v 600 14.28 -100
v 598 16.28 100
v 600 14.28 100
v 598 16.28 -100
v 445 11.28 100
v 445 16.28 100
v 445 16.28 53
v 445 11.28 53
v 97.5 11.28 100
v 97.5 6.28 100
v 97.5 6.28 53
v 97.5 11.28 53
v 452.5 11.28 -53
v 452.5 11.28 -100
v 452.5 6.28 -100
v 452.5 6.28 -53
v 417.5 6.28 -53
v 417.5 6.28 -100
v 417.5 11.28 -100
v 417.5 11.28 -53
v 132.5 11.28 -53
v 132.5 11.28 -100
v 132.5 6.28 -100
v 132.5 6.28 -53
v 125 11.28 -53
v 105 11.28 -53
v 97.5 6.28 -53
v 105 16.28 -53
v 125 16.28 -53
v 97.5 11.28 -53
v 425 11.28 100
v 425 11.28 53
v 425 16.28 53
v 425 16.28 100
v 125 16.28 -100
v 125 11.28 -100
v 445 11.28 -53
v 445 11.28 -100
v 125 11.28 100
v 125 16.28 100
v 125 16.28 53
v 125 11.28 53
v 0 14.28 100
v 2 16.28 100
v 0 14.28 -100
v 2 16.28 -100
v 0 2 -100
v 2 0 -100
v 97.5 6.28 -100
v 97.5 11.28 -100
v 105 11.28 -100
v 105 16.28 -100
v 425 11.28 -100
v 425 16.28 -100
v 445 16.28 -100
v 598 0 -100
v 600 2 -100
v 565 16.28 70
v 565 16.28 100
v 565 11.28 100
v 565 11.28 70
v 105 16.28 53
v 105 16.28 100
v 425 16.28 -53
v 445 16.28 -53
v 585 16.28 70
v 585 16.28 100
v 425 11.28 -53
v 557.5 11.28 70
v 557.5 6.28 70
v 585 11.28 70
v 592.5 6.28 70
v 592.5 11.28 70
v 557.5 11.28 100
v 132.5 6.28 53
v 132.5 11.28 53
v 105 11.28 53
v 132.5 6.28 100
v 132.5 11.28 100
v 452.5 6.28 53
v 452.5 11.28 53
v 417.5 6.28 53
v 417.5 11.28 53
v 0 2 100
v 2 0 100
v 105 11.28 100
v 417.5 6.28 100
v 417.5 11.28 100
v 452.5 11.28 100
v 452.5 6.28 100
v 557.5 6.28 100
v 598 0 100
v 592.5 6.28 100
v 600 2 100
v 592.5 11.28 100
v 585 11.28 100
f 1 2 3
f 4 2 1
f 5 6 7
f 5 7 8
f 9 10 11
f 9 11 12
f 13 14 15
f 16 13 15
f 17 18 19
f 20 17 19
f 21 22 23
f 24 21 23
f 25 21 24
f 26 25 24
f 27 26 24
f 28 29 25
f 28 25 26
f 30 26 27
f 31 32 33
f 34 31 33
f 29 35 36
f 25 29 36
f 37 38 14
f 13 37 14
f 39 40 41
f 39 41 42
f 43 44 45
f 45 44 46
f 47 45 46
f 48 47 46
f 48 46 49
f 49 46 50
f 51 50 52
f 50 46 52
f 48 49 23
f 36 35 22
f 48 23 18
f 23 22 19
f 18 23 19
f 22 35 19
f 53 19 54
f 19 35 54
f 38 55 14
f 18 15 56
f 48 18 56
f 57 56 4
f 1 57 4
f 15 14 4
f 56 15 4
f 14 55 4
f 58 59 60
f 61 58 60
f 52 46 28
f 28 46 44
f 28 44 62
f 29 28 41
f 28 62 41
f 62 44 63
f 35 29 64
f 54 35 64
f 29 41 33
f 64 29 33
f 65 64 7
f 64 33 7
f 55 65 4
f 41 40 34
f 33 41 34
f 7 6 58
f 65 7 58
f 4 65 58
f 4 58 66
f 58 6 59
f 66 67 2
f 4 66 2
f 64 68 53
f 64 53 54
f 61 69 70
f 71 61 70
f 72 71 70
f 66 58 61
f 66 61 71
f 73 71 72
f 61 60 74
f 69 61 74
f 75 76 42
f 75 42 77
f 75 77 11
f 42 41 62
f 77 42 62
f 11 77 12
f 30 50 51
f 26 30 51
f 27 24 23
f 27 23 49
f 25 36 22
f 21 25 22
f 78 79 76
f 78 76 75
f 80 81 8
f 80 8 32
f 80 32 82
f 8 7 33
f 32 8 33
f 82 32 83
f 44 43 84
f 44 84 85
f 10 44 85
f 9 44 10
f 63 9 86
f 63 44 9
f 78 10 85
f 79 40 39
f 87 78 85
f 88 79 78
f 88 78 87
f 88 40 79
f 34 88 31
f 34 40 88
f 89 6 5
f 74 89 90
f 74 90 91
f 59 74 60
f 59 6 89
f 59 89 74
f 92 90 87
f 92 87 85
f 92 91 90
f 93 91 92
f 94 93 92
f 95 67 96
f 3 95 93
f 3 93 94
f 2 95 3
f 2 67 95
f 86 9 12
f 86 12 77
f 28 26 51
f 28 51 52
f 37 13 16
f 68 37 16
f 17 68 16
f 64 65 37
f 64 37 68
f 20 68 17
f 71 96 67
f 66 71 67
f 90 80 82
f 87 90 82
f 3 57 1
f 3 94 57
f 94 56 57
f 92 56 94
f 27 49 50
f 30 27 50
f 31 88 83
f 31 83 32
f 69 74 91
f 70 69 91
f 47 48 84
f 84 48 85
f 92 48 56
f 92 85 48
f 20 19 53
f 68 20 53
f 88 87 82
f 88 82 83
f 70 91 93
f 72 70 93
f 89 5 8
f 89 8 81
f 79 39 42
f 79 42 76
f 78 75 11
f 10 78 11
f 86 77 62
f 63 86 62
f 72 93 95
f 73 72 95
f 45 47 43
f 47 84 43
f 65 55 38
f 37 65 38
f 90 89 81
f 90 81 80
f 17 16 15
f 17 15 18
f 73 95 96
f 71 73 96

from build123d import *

# Parameters (mm, degrees)
ESQUISSE1_W             = 600
ESQUISSE1_H             = 16.28
BOSS_EXTRU_1_DEPTH      = 100
CHANFREIN1_SIZE         = 2
ENL_V_START             = -53
ENL_V_MAT_EXTRU_1_DEPTH = 48
ENL_V_START_2           = 53
ENL_V_MAT_EXTRU_2_DEPTH = 48
ENL_V_START_3           = 100
ENL_V_MAT_EXTRU_4_DEPTH = 30


with BuildPart() as part:
    # Esquisse1 → Boss.-Extru.1 (new body, symmetric)
    with BuildSketch(Plane.XY):
        with Locations((300, 8.14)):
            Rectangle(ESQUISSE1_W, ESQUISSE1_H)
    extrude(amount=BOSS_EXTRU_1_DEPTH, both=True)

    # Chanfrein1
    chanfrein1_edges = [part.edges().sort_by_distance(p)[0] for p in [
        (600, 16.28, 0),
        (600, 0, 0),
        (0, 0, 0),
        (0, 16.28, 0),
    ]]
    chamfer(chanfrein1_edges, length=CHANFREIN1_SIZE)

    # Esquisse1_4 → Enl_v. mat.-Extru.1 (cut, through all)
    with BuildSketch(Plane.XY.offset(ENL_V_START)):
        Polygon((105, 16.28), (125, 16.28), (125, 11.28), (132.5, 11.28), (132.5, 6.28), (97.5, 6.28), (97.5, 11.28), (105, 11.28), align=None)
        Polygon((425, 16.28), (445, 16.28), (445, 11.28), (452.5, 11.28), (452.5, 6.28), (417.5, 6.28), (417.5, 11.28), (425, 11.28), align=None)
    extrude(amount=-ENL_V_MAT_EXTRU_1_DEPTH, mode=Mode.SUBTRACT)

    # Esquisse1_5 → Enl_v. mat.-Extru.2 (cut, through all)
    with BuildSketch(Plane.XY.offset(ENL_V_START_2)):
        Polygon((105, 16.28), (125, 16.28), (125, 11.28), (132.5, 11.28), (132.5, 6.28), (97.5, 6.28), (97.5, 11.28), (105, 11.28), align=None)
        Polygon((425, 16.28), (445, 16.28), (445, 11.28), (452.5, 11.28), (452.5, 6.28), (417.5, 6.28), (417.5, 11.28), (425, 11.28), align=None)
    extrude(amount=ENL_V_MAT_EXTRU_2_DEPTH, mode=Mode.SUBTRACT)

    # Esquisse1_9 → Enl_v. mat.-Extru.4 (cut)
    with BuildSketch(Plane.XY.offset(ENL_V_START_3)):
        Polygon((585, 11.28), (585, 16.28), (565, 16.28), (565, 11.28), (557.5, 11.28), (557.5, 6.28), (592.5, 6.28), (592.5, 11.28), align=None)
    extrude(amount=-ENL_V_MAT_EXTRU_4_DEPTH, mode=Mode.SUBTRACT)


solid = part.part
